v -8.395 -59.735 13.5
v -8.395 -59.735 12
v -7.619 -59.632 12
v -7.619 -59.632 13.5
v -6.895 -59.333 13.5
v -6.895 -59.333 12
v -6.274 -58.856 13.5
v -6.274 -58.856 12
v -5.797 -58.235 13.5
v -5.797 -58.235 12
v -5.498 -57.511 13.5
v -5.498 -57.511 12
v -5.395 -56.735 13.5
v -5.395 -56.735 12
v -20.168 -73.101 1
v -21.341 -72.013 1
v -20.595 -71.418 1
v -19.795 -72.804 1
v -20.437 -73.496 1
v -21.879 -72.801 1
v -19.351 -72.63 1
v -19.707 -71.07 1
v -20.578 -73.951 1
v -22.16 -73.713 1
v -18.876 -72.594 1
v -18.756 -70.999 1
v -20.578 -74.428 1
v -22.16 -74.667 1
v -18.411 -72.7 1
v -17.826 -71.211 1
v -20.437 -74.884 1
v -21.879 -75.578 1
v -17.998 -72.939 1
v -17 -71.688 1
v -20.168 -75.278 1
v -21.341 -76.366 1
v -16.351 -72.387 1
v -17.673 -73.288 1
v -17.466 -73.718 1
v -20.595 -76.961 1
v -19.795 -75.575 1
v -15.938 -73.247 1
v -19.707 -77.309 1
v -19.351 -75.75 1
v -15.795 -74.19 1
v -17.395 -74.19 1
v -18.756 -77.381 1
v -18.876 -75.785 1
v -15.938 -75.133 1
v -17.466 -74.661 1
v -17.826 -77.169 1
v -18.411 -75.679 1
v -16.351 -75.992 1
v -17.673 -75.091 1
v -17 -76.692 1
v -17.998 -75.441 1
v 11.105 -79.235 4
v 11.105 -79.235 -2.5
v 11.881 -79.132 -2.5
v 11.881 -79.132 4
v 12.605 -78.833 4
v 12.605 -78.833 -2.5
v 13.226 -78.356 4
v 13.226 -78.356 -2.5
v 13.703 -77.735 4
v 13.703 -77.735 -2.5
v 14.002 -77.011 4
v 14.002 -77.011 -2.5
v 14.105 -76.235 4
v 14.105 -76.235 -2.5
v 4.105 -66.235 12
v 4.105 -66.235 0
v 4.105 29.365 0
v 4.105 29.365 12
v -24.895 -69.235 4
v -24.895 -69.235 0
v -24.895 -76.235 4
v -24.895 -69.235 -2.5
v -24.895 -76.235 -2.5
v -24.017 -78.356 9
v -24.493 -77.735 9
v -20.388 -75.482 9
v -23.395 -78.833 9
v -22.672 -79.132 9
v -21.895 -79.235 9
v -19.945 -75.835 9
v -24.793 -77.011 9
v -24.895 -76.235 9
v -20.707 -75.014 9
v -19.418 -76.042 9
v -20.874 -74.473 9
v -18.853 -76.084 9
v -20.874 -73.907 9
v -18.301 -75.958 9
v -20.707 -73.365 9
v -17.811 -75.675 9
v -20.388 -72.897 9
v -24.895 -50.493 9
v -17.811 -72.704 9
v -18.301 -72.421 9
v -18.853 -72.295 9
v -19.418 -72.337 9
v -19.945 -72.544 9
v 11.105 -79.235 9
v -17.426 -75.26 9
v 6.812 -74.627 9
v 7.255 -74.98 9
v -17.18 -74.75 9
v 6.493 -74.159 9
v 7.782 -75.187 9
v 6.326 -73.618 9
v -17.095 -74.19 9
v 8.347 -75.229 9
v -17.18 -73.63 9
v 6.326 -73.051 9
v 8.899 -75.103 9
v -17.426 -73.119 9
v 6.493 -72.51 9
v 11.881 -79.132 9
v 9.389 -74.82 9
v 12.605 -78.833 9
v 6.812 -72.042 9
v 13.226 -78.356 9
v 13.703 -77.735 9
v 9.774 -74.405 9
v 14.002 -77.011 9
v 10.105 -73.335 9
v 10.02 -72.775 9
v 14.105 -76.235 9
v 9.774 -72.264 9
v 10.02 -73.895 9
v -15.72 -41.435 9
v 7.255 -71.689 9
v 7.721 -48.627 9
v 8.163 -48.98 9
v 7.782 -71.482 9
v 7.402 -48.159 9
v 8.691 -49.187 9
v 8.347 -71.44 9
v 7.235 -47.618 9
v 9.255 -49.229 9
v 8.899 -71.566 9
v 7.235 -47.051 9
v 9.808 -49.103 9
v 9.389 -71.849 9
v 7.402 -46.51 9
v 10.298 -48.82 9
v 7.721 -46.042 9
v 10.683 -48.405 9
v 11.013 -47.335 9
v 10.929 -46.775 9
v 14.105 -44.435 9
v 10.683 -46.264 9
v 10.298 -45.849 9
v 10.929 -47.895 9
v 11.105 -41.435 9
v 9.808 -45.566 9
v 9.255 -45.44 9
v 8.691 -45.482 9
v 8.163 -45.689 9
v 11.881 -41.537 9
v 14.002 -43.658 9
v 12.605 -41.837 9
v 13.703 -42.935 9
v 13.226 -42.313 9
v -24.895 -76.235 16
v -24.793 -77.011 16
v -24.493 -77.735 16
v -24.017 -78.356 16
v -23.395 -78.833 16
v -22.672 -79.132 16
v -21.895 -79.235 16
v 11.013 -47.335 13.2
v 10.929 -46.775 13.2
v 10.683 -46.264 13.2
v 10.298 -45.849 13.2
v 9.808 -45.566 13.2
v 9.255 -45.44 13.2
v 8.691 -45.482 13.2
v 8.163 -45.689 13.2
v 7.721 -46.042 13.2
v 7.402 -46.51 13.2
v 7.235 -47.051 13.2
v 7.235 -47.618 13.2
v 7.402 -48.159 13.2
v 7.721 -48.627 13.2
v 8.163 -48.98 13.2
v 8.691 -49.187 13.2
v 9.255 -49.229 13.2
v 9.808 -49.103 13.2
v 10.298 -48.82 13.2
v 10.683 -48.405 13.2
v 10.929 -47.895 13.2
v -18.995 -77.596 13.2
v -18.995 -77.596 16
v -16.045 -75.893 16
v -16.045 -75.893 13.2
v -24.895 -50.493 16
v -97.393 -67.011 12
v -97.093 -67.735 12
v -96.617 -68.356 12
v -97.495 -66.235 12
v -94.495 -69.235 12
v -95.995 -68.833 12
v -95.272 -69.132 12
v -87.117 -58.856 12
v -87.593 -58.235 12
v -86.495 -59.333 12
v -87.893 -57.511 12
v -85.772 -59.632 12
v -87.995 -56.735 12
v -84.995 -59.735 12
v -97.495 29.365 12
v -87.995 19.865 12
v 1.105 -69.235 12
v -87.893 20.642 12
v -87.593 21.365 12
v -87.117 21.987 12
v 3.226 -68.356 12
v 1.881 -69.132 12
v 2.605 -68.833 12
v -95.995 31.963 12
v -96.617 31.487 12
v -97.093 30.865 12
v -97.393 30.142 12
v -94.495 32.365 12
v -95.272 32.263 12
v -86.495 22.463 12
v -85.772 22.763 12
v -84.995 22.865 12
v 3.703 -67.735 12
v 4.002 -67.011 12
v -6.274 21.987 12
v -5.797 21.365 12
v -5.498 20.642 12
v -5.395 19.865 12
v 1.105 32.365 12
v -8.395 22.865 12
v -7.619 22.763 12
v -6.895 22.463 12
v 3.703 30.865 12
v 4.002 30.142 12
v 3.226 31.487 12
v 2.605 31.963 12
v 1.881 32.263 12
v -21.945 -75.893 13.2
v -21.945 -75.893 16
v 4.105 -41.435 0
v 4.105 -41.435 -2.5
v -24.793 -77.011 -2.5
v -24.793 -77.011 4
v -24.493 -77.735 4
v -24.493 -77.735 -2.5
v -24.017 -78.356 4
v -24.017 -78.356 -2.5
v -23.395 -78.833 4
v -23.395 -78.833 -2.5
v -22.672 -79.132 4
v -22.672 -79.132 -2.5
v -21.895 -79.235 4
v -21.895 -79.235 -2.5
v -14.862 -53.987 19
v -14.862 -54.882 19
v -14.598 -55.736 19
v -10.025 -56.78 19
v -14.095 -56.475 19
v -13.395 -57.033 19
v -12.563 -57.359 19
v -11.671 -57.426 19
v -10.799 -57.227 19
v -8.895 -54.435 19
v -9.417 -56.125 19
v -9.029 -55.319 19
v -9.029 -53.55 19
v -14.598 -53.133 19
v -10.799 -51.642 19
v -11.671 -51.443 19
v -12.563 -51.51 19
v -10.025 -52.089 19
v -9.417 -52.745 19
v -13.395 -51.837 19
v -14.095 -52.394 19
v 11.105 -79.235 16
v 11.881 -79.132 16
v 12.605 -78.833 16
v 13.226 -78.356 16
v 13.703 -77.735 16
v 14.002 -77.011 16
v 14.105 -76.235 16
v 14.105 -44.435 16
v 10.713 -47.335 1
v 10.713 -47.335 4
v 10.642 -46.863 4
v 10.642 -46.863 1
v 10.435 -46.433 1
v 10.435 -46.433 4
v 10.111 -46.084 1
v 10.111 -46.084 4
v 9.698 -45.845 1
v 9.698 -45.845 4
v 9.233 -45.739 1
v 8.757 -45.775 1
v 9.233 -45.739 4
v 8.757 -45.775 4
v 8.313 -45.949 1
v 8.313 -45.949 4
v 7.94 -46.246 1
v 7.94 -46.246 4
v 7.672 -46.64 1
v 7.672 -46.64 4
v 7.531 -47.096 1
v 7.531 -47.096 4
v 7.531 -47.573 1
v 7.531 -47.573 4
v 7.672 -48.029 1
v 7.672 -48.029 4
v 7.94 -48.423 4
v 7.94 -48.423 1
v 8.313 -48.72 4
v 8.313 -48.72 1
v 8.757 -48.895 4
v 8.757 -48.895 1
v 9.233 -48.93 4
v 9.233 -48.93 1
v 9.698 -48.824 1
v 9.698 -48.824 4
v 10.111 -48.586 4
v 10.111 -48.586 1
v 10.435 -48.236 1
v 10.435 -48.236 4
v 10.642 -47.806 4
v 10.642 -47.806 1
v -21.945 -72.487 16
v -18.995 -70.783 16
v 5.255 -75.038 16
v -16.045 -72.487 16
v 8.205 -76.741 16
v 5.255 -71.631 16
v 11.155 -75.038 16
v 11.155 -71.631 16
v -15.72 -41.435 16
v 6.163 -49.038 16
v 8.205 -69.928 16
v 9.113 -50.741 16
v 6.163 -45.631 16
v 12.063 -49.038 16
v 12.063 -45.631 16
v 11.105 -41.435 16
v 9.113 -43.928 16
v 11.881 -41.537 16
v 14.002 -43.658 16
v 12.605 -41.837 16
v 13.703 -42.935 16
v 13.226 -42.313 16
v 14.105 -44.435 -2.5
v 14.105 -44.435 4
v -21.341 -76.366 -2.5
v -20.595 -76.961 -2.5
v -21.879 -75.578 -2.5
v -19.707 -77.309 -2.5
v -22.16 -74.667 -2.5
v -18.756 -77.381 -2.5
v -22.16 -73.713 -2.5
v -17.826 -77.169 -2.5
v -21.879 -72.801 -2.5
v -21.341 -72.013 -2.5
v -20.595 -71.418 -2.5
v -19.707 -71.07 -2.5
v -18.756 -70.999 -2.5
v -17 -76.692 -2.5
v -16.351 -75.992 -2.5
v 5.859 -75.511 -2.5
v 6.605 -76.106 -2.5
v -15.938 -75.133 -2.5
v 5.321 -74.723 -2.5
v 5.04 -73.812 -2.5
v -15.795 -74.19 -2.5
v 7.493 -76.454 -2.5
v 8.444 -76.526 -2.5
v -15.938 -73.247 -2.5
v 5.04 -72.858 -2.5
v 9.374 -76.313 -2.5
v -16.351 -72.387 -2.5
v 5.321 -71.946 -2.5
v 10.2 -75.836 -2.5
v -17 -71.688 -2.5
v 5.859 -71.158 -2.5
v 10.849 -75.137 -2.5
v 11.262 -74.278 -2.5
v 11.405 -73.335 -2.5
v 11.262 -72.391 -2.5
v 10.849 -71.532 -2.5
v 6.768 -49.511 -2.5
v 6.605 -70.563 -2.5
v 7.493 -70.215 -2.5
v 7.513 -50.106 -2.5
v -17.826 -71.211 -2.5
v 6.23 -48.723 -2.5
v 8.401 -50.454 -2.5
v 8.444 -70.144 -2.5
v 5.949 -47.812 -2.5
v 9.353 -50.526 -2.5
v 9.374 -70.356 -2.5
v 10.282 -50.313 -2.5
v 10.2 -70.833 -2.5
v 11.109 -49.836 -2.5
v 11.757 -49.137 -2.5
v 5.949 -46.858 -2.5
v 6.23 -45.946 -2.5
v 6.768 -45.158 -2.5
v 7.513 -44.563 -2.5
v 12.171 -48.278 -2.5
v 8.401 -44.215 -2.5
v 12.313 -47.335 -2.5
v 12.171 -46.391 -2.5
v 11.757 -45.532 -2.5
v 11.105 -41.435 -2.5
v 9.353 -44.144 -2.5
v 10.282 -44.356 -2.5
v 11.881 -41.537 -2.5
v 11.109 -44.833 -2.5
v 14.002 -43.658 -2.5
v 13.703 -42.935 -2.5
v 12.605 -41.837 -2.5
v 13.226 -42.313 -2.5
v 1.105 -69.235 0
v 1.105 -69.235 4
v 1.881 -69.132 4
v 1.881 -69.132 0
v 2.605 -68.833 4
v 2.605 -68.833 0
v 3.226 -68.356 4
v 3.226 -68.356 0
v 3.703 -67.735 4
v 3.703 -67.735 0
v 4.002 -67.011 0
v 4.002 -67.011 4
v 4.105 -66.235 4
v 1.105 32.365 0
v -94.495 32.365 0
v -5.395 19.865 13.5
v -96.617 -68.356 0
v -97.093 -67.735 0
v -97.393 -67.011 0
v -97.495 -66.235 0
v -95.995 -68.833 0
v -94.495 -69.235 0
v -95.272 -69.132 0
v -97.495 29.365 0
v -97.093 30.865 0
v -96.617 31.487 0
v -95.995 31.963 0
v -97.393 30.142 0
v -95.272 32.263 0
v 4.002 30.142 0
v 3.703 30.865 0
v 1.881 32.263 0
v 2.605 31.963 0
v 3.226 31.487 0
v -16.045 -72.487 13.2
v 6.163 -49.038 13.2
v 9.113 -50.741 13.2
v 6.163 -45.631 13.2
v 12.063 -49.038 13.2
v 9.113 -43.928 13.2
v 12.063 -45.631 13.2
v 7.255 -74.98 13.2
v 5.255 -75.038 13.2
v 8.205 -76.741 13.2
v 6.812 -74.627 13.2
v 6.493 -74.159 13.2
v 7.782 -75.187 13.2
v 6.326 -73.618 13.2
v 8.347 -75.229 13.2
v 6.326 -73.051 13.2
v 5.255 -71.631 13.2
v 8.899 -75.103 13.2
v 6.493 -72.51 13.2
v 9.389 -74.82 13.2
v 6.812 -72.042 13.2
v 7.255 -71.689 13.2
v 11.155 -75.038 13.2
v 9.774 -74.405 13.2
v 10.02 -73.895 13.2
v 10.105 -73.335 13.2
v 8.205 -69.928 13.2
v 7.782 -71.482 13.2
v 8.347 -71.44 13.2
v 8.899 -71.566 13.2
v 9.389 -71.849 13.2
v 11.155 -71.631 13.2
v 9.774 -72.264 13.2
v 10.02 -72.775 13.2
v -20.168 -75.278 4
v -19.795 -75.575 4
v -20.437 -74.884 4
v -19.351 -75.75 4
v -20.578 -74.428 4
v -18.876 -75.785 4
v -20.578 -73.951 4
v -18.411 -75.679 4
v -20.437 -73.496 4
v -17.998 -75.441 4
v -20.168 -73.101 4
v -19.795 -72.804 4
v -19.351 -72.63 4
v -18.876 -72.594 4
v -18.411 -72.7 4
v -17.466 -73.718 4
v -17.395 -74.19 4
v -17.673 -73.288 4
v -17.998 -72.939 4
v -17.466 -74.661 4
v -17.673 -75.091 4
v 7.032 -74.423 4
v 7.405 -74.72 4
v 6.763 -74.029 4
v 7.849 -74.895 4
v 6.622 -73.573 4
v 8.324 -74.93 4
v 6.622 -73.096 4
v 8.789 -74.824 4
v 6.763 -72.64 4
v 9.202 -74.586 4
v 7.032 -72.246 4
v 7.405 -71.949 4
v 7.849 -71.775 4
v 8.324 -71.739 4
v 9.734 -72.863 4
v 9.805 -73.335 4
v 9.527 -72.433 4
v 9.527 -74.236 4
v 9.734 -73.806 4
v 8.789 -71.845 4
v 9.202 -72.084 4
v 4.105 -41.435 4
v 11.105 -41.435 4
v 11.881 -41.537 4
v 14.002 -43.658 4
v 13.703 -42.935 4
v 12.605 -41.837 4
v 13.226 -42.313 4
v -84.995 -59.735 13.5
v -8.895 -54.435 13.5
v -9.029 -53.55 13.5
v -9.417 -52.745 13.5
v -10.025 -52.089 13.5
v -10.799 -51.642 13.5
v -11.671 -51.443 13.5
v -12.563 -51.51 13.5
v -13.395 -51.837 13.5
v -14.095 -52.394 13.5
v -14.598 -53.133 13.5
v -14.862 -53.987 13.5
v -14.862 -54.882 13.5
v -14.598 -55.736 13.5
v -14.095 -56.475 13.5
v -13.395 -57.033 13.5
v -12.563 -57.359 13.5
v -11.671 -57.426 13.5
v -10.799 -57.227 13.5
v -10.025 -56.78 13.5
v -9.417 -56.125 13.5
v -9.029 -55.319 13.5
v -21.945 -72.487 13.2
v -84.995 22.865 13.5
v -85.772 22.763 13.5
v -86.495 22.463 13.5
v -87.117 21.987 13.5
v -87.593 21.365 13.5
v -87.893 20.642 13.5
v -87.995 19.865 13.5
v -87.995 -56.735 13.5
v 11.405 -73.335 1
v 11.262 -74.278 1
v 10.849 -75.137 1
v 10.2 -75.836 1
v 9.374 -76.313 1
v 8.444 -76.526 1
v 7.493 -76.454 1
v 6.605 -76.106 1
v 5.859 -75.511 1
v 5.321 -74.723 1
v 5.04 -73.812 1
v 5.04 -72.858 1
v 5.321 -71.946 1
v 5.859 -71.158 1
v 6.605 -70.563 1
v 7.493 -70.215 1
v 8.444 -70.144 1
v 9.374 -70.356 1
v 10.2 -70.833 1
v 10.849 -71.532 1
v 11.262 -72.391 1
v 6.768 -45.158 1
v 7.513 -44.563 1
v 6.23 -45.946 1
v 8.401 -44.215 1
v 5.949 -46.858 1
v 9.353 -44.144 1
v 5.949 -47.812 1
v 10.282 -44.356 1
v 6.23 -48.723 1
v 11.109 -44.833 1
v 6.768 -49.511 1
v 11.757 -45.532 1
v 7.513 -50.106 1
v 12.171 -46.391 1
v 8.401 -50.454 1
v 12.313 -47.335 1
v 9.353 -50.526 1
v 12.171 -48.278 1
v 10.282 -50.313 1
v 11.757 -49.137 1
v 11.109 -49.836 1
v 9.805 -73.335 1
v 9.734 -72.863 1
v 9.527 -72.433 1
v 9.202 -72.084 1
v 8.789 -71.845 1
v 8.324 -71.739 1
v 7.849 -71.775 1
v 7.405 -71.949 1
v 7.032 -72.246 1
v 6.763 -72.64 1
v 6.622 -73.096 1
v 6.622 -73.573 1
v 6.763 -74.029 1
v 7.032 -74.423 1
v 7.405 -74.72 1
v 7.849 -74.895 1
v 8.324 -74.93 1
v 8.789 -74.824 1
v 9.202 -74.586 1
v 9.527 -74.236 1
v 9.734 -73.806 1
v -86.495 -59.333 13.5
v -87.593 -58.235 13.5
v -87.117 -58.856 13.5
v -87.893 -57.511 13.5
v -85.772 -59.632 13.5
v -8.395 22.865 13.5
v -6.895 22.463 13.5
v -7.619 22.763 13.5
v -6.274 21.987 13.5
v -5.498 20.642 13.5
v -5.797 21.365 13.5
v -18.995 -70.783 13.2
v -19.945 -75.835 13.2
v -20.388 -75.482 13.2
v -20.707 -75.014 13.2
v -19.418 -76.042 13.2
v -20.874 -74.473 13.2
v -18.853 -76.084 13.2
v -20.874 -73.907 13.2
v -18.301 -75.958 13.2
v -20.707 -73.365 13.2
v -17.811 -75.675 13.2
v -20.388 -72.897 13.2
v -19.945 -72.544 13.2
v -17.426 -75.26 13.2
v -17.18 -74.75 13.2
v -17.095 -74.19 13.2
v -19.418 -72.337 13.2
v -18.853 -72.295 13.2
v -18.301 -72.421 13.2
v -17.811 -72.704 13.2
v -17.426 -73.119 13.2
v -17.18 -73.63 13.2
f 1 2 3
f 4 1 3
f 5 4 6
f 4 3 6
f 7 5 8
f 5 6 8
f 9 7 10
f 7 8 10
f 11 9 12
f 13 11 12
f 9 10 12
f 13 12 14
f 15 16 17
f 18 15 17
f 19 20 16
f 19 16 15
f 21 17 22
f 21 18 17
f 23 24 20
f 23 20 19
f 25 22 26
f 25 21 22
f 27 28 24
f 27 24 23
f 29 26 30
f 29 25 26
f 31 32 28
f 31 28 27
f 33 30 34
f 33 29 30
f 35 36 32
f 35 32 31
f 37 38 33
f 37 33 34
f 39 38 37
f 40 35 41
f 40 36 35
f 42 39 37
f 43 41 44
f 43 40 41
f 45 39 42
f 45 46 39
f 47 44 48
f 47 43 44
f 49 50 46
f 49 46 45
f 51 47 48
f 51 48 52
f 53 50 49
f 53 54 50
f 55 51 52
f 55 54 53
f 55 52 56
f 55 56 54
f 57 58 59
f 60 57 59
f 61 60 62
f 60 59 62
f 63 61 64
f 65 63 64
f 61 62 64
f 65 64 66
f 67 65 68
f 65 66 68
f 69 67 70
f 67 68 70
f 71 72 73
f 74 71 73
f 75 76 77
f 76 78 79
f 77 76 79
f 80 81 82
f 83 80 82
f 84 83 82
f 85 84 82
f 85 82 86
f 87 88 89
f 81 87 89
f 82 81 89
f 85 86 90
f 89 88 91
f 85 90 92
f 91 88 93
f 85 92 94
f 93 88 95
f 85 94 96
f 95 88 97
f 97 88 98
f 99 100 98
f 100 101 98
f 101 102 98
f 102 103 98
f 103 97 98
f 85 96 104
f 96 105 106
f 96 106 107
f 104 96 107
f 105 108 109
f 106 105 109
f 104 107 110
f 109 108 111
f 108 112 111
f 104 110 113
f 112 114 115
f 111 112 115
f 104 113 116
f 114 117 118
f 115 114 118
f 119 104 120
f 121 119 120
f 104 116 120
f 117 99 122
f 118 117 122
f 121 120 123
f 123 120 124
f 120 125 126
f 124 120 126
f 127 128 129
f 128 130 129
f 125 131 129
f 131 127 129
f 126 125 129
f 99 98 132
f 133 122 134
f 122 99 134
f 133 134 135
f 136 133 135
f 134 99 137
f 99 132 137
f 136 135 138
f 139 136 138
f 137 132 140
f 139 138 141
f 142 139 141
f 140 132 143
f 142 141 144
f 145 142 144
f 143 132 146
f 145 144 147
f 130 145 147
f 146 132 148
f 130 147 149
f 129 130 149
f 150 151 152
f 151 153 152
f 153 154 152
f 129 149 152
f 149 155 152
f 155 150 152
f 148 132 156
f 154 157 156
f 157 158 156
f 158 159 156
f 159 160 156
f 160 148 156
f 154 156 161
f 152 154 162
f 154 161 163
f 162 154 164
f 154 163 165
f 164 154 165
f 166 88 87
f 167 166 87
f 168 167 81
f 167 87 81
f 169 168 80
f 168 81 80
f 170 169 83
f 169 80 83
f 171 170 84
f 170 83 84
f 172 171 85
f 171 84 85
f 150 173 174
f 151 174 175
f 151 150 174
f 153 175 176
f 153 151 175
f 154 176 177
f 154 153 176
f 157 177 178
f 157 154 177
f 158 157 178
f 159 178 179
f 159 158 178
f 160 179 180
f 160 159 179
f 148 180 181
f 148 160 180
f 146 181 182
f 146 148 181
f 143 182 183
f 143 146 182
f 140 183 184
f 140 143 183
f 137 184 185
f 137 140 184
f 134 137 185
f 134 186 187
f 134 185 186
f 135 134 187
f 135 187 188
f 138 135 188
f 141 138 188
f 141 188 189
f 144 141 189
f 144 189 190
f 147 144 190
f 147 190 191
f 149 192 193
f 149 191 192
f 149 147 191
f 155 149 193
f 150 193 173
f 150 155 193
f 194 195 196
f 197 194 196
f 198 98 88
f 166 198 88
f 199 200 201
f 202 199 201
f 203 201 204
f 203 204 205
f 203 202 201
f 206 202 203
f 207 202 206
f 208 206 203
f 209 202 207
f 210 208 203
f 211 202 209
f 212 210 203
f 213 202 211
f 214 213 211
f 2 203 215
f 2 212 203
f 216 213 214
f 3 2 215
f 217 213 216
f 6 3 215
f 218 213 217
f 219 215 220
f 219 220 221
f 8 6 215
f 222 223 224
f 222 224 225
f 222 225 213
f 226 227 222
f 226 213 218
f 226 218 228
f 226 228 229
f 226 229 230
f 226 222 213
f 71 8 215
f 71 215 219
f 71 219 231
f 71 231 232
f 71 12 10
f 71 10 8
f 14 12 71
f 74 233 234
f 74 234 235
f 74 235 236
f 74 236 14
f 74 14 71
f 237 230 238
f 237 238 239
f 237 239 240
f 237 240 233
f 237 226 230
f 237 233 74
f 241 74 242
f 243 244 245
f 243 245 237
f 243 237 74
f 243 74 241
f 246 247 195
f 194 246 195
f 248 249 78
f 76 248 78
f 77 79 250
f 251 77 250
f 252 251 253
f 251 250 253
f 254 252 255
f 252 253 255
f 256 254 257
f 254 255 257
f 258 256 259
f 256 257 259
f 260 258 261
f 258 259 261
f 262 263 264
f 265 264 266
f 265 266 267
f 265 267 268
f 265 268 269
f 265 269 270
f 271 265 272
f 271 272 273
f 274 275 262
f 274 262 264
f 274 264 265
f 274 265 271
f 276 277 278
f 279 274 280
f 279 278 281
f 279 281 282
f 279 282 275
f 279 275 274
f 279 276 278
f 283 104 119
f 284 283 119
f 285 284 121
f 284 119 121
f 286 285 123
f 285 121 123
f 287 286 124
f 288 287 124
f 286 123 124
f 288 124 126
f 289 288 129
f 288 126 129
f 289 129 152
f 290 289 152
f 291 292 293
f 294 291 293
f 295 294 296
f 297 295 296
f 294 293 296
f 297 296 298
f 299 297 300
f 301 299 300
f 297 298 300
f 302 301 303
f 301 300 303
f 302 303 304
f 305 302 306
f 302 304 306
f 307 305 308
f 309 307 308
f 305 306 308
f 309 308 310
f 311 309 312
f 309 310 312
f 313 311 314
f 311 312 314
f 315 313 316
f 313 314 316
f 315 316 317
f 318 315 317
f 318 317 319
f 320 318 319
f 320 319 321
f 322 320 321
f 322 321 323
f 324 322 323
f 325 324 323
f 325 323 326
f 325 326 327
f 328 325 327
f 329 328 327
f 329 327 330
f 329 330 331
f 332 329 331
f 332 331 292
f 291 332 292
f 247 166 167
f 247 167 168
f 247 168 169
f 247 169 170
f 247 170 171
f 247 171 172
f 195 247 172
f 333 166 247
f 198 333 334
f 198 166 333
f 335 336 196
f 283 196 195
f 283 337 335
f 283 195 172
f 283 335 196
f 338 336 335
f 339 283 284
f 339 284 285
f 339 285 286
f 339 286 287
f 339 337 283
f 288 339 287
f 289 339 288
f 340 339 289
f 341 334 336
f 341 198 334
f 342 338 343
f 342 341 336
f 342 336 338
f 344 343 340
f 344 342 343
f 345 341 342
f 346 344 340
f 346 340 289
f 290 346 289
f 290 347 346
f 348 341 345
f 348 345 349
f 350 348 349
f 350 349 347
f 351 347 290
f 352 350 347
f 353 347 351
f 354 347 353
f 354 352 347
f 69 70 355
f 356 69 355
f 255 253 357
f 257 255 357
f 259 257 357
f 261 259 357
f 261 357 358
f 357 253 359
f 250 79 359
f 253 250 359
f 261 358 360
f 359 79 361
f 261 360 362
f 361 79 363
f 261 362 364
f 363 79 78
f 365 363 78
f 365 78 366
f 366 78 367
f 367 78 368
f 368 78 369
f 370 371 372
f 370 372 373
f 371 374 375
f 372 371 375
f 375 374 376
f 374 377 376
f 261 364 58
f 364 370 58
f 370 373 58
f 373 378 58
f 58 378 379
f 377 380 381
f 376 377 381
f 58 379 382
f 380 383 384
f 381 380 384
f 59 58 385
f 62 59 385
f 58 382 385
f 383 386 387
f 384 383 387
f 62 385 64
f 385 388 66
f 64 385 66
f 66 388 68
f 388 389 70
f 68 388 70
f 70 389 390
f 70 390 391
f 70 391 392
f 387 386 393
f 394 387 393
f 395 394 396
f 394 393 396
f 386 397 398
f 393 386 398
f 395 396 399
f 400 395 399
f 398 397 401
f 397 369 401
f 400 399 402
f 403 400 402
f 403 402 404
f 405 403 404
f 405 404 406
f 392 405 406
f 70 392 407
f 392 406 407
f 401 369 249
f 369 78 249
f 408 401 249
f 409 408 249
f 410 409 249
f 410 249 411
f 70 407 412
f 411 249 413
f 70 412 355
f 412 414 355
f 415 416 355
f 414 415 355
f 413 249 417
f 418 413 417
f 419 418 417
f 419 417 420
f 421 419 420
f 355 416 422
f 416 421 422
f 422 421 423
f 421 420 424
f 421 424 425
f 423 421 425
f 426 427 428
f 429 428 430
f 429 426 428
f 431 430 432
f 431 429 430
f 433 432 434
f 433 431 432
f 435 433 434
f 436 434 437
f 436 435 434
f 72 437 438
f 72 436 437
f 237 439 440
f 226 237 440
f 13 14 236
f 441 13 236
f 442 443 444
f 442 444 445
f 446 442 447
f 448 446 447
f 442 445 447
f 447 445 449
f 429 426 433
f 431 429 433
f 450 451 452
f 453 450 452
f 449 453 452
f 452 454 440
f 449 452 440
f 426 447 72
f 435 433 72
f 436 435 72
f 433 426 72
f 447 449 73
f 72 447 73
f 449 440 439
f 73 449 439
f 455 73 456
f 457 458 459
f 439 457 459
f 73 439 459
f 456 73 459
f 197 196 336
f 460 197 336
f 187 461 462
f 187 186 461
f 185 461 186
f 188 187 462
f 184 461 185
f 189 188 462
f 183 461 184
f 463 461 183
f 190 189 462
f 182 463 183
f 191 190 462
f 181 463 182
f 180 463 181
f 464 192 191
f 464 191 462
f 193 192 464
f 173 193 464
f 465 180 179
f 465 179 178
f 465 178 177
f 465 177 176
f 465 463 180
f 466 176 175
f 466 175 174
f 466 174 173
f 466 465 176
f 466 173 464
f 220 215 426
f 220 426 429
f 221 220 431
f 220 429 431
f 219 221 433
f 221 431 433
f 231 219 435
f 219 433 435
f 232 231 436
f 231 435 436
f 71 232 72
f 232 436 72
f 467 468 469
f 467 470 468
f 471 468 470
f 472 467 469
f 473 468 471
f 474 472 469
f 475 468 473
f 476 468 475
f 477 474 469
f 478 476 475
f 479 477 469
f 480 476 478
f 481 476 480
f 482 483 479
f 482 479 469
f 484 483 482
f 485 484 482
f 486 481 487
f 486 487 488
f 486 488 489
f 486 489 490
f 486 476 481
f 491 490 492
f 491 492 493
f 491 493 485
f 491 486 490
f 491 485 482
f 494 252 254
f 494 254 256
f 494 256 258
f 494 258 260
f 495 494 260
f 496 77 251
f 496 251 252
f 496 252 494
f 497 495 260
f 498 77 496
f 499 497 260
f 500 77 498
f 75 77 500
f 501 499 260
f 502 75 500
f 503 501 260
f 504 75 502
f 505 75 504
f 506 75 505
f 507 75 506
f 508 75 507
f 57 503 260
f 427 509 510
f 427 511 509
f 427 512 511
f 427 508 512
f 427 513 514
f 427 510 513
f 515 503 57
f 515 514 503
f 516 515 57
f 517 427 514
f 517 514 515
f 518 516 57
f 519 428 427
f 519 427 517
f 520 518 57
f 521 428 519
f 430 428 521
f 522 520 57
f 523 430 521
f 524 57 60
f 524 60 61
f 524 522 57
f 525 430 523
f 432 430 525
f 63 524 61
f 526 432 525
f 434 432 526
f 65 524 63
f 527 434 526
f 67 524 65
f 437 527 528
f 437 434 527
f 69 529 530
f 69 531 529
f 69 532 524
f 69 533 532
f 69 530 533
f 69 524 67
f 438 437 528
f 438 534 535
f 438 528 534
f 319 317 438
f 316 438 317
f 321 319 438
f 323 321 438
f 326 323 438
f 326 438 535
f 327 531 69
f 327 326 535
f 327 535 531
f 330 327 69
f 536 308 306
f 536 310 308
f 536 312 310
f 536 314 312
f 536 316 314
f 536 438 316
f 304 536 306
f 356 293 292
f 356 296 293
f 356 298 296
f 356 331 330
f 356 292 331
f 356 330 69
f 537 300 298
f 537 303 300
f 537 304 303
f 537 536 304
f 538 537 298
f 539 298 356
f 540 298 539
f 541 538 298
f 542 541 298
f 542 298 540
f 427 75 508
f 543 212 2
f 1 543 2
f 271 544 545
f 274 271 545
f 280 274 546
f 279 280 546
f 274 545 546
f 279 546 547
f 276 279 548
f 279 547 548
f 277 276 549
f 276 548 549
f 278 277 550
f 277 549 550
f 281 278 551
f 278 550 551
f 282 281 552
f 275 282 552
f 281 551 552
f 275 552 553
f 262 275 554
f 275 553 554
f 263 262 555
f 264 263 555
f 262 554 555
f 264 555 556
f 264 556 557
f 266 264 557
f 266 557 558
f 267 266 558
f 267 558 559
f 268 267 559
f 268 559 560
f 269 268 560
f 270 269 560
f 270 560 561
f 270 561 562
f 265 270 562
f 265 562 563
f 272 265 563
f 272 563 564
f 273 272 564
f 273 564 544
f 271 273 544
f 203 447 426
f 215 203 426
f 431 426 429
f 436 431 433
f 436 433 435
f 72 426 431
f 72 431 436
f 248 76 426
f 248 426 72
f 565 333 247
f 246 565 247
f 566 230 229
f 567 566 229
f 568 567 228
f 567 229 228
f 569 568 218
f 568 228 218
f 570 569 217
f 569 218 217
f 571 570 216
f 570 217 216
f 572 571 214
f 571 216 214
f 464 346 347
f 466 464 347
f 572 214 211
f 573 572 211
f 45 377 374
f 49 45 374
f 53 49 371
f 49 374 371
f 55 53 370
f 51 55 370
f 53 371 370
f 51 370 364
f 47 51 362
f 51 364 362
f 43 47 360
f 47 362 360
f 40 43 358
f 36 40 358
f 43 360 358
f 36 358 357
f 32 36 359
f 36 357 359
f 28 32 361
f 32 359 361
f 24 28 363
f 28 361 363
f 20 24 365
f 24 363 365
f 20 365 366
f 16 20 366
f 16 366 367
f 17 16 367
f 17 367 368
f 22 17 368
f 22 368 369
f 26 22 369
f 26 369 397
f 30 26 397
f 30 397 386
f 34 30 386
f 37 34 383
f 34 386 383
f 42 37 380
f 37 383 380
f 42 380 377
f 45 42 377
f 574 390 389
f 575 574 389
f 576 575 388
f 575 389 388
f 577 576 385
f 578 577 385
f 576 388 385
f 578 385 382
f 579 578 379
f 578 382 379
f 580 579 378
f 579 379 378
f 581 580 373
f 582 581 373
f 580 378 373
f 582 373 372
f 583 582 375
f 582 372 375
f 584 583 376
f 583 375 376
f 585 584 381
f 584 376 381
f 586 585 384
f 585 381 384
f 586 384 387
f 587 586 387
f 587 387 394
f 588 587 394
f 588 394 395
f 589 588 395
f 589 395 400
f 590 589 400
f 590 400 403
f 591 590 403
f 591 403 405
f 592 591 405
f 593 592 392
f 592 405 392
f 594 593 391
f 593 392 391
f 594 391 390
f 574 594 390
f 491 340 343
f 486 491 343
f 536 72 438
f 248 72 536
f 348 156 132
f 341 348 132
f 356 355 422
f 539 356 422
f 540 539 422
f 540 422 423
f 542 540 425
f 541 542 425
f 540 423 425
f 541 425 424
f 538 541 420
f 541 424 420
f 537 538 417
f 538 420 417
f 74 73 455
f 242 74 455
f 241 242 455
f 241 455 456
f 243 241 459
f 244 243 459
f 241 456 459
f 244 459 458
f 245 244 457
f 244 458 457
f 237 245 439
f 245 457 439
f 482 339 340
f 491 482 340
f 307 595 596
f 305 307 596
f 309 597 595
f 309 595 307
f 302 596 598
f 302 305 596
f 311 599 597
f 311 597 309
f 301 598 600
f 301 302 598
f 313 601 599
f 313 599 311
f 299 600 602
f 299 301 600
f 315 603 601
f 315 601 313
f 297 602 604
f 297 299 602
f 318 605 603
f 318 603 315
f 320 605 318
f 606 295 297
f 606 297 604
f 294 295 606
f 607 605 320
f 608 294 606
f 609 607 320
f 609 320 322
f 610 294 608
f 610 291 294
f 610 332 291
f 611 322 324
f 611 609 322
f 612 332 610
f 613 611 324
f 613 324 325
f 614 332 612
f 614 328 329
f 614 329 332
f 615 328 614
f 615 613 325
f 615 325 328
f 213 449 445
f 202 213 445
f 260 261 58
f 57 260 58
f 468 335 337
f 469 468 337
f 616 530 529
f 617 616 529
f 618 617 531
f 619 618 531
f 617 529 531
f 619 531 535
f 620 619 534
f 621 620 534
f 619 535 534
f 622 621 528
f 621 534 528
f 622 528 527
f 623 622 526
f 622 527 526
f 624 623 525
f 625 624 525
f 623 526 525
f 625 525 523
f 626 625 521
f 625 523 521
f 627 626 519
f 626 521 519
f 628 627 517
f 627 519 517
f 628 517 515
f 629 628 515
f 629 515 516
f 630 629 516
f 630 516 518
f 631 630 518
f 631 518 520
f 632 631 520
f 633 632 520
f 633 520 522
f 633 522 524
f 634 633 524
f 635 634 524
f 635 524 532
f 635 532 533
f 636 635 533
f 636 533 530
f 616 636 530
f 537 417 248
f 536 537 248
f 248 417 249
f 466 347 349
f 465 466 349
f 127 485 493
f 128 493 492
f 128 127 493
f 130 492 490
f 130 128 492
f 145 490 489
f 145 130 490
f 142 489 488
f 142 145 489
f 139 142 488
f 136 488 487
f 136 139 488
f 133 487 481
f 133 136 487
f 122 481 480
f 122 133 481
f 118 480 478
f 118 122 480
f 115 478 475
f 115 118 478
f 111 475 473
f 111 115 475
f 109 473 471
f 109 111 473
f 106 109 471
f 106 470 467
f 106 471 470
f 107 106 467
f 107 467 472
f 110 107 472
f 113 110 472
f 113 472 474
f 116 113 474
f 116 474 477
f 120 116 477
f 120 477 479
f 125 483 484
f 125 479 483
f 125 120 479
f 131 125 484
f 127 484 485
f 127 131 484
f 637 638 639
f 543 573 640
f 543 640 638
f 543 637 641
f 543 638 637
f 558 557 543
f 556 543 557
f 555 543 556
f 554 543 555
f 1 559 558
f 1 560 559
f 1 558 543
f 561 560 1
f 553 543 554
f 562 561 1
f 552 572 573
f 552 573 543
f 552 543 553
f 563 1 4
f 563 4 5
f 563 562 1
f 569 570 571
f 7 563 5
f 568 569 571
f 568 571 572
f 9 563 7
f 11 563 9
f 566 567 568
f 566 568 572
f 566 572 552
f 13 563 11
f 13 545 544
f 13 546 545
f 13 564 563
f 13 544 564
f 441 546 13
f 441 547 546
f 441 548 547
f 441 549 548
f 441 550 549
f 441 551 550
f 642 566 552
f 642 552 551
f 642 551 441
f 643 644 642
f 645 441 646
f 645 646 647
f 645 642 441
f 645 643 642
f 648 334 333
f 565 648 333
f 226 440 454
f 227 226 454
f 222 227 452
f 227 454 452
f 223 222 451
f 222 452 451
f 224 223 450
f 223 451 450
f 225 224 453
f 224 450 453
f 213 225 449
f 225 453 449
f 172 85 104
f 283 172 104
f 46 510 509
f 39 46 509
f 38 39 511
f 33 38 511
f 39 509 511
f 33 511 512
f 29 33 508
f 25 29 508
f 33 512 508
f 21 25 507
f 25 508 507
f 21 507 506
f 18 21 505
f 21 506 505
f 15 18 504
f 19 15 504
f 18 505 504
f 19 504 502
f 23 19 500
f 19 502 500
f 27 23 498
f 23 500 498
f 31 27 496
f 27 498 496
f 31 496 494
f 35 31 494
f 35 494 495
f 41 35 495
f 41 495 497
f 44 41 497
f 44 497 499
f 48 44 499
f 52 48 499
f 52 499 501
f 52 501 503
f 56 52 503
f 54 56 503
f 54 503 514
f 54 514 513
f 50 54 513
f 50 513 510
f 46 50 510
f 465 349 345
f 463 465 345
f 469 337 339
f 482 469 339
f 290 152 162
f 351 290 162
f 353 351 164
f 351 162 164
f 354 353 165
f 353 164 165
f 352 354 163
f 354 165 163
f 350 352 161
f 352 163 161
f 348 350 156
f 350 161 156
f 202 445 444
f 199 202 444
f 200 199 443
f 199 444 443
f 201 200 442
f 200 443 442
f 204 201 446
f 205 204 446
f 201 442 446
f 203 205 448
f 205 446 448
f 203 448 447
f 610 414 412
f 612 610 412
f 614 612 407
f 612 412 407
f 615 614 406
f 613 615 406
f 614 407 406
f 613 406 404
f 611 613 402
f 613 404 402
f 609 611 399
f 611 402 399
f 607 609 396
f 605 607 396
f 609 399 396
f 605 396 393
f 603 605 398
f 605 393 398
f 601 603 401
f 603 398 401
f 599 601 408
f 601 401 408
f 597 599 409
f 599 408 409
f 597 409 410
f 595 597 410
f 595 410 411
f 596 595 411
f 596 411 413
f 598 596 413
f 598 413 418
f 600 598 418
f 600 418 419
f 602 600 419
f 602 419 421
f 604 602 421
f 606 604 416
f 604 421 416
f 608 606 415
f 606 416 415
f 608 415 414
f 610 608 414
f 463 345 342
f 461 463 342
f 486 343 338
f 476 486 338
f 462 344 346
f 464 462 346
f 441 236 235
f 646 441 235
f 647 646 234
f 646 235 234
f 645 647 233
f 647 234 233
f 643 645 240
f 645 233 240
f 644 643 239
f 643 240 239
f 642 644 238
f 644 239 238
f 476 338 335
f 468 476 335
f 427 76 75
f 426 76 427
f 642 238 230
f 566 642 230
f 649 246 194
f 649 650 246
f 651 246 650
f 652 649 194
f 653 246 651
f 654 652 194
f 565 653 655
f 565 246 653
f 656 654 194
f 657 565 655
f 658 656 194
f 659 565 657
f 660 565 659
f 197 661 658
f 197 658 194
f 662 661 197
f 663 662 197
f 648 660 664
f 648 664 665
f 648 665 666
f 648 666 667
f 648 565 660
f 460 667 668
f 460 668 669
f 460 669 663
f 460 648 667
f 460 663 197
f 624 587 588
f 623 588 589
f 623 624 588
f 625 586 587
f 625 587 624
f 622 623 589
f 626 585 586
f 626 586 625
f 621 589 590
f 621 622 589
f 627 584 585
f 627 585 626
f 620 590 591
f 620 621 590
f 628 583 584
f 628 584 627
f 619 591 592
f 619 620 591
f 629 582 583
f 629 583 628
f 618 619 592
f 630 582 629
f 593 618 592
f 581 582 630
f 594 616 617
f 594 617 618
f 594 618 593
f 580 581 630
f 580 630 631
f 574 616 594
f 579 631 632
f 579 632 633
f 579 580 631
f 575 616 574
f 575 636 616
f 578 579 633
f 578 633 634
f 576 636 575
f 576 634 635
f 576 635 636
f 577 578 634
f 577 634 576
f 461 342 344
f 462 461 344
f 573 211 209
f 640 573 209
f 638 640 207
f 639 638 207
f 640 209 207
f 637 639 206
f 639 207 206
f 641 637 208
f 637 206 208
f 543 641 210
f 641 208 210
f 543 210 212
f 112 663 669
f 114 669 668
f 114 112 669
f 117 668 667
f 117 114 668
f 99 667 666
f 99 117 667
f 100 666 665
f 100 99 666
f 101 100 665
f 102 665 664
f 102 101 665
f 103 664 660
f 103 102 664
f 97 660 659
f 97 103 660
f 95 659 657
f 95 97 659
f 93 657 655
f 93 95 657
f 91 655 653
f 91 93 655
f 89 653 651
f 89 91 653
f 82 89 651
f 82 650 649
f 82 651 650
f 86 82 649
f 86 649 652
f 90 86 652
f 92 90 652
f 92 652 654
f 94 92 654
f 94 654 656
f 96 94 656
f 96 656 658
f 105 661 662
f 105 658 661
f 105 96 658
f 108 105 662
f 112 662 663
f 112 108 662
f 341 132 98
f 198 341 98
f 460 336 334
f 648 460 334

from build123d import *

# Parameters (mm, degrees)
F1_DEPTH  = 12
F0_R      = 3
F2_DEPTH  = 13.5
F3_DEPTH  = 19
F4_R      = 1.9
F5_DEPTH  = 7
F10_DEPTH = 2.8
F13_DEPTH = 6.5
F16_R     = 3.2
F17_DEPTH = 3.5
F19_R     = 1.6
F20_DEPTH = 6.501


with BuildPart() as f1:
    # F0 (on Top) → F1 (new body)
    with BuildSketch(Plane.XY):
        with BuildLine():
            Line((1.1045844555, 32.365380348), (-94.4954155445, 32.365380348))
            ThreePointArc((-94.4954155445, 32.365380348), (-96.6167358881, 31.4867006915), (-97.4954155445, 29.365380348))
            Line((-97.4954155445, 29.365380348), (-97.4954155445, -66.234619652))
            ThreePointArc((-97.4954155445, -66.234619652), (-96.6167358881, -68.3559399956), (-94.4954155445, -69.234619652))
            Line((-94.4954155445, -69.234619652), (1.1045844555, -69.234619652))
            ThreePointArc((1.1045844555, -69.234619652), (3.225904799, -68.3559399956), (4.1045844555, -66.234619652))
            Line((4.1045844555, -66.234619652), (4.1045844555, 29.365380348))
            ThreePointArc((4.1045844555, 29.365380348), (3.225904799, 31.4867006915), (1.1045844555, 32.365380348))
        make_face()
        with BuildLine():
            ThreePointArc((-87.9954155445, 19.865380348), (-87.1167358881, 21.9867006915), (-84.9954155445, 22.865380348))
            Line((-84.9954155445, 22.865380348), (-8.3954155445, 22.865380348))
            ThreePointArc((-8.3954155445, 22.865380348), (-6.274095201, 21.9867006915), (-5.3954155445, 19.865380348))
            Line((-5.3954155445, 19.865380348), (-5.3954155445, -56.734619652))
            ThreePointArc((-5.3954155445, -56.734619652), (-6.274095201, -58.8559399956), (-8.3954155445, -59.734619652))
            Line((-8.3954155445, -59.734619652), (-84.9954155445, -59.734619652))
            ThreePointArc((-84.9954155445, -59.734619652), (-87.1167358881, -58.8559399956), (-87.9954155445, -56.734619652))
            Line((-87.9954155445, -56.734619652), (-87.9954155445, 19.865380348))
        make_face(mode=Mode.SUBTRACT)
    extrude(amount=F1_DEPTH)

    # F0 (on Top) → F2 (join)
    with BuildSketch(Plane.XY):
        with BuildLine():
            Line((-8.3954155445, 22.865380348), (-84.9954155445, 22.865380348))
            ThreePointArc((-84.9954155445, 22.865380348), (-87.1167358881, 21.9867006915), (-87.9954155445, 19.865380348))
            Line((-87.9954155445, 19.865380348), (-87.9954155445, -56.734619652))
            ThreePointArc((-87.9954155445, -56.734619652), (-87.1167358881, -58.8559399956), (-84.9954155445, -59.734619652))
            Line((-84.9954155445, -59.734619652), (-8.3954155445, -59.734619652))
            ThreePointArc((-8.3954155445, -59.734619652), (-6.274095201, -58.8559399956), (-5.3954155445, -56.734619652))
            Line((-5.3954155445, -56.734619652), (-5.3954155445, 19.865380348))
            ThreePointArc((-5.3954155445, 19.865380348), (-6.274095201, 21.9867006915), (-8.3954155445, 22.865380348))
        make_face()
        with Locations((-11.8954155445, -54.434619652)):
            Circle(F0_R, mode=Mode.SUBTRACT)
    extrude(amount=F2_DEPTH)

    # F0 (on Top) → F3 (join)
    with BuildSketch(Plane.XY):
        with Locations((-11.8954155445, -54.434619652)):
            Circle(F0_R)
    extrude(amount=F3_DEPTH)


with BuildPart() as f5:
    # F4 (on Top) → F5 (new body)
    with BuildSketch(Plane.XY):
        with BuildLine():
            ThreePointArc((14.1045844555, -44.434619652), (13.225904799, -42.3132993085), (11.1045844555, -41.434619652))
            Line((11.1045844555, -41.434619652), (-15.7201327384, -41.434619652))
            Line((-15.7201327384, -41.434619652), (-24.8954155445, -50.4931248724))
            Line((-24.8954155445, -50.4931248724), (-24.8954155445, -76.234619652))
            ThreePointArc((-24.8954155445, -76.234619652), (-24.0167358881, -78.3559399956), (-21.8954155445, -79.234619652))
            Line((-21.8954155445, -79.234619652), (11.1045844555, -79.234619652))
            ThreePointArc((11.1045844555, -79.234619652), (13.225904799, -78.3559399956), (14.1045844555, -76.234619652))
            Line((14.1045844555, -76.234619652), (14.1045844555, -44.434619652))
        make_face()
        with Locations((-18.9954155445, -74.1897211546)):
            Circle(F4_R, mode=Mode.SUBTRACT)
        with Locations((8.2045844555, -73.334619652)):
            Circle(F4_R, mode=Mode.SUBTRACT)
        with Locations((9.113365896, -47.334619652)):
            Circle(F4_R, mode=Mode.SUBTRACT)
    extrude(amount=F5_DEPTH)


with BuildPart() as f5_1:
    # F6: moved
    add(f5.part.moved(Location((0, 0, 3))))

    # F9 (on offset) → F10 (cut)
    with BuildSketch(Plane.XY.offset(10)):
        Polygon((8.2045844555, -69.9282530638), (5.2545844555, -71.6314363579), (5.2545844555, -75.0378029461), (8.2045844555, -76.7409862402), (11.1545844555, -75.0378029461), (11.1545844555, -71.6314363579), align=None)
        Polygon((9.113365896, -43.9282530638), (6.163365896, -45.6314363579), (6.163365896, -49.0378029461), (9.113365896, -50.7409862402), (12.063365896, -49.0378029461), (12.063365896, -45.6314363579), align=None)
        Polygon((-18.9954155445, -70.7833545663), (-21.9454155445, -72.4865378605), (-21.9454155445, -75.8929044487), (-18.9954155445, -77.5960877428), (-16.0454155445, -75.8929044487), (-16.0454155445, -72.4865378605), align=None)
    extrude(amount=-F10_DEPTH, mode=Mode.SUBTRACT)


with BuildPart() as f5_2:
    # F11: moved
    add(f5_1.part.moved(Location((0, 0, 8.8))))


with BuildPart() as f5_3:
    # F12: moved
    add(f5_2.part.moved(Location((0, 0, -0.8))))


with BuildPart() as f13:
    # F7 (on Top) → F13 (new body)
    with BuildSketch(Plane.XY):
        with BuildLine():
            Line((11.1045844555, -41.434619652), (4.1045844555, -41.434619652))
            Line((4.1045844555, -41.434619652), (-24.8954155445, -69.234619652))
            Line((-24.8954155445, -69.234619652), (-24.8954155445, -76.234619652))
            ThreePointArc((-24.8954155445, -76.234619652), (-24.0167358881, -78.3559399956), (-21.8954155445, -79.234619652))
            Line((-21.8954155445, -79.234619652), (11.1045844555, -79.234619652))
            ThreePointArc((11.1045844555, -79.234619652), (13.225904799, -78.3559399956), (14.1045844555, -76.234619652))
            Line((14.1045844555, -76.234619652), (14.1045844555, -44.434619652))
            ThreePointArc((14.1045844555, -44.434619652), (13.225904799, -42.3132993085), (11.1045844555, -41.434619652))
        make_face()
    extrude(amount=F13_DEPTH)


with BuildPart() as f13_1:
    # F14: moved
    add(f13.part.moved(Location((0, 0, -2.5))))

    # F16 (on offset) → F17 (cut)
    with BuildSketch(Plane(origin=(0, 0, -2.5), x_dir=(1, 0, 0), z_dir=(0, 0, -1))):
        with Locations((-18.9954155445, 74.1897211546)):
            Circle(F16_R)
        with Locations((8.2045844555, 73.334619652)):
            Circle(F16_R)
        with Locations((9.113365896, 47.334619652)):
            Circle(F16_R)
    extrude(amount=-F17_DEPTH, mode=Mode.SUBTRACT)

    # F19 (on offset) → F20 (cut, through all)
    with BuildSketch(Plane.XY.offset(4)):
        with Locations((-18.9954155445, -74.1897211546)):
            Circle(F19_R)
        with Locations((9.113365896, -47.334619652)):
            Circle(F19_R)
        with Locations((8.2045844555, -73.334619652)):
            Circle(F19_R)
    extrude(amount=-F20_DEPTH, mode=Mode.SUBTRACT)

    # F21: cut F1
    add(f1.part, mode=Mode.SUBTRACT)


with BuildPart() as f5_4:
    # F22: moved
    add(f5_3.part.moved(Location((0, 0, -2))))


solid = Compound([f1.part, f13_1.part, f5_4.part])
